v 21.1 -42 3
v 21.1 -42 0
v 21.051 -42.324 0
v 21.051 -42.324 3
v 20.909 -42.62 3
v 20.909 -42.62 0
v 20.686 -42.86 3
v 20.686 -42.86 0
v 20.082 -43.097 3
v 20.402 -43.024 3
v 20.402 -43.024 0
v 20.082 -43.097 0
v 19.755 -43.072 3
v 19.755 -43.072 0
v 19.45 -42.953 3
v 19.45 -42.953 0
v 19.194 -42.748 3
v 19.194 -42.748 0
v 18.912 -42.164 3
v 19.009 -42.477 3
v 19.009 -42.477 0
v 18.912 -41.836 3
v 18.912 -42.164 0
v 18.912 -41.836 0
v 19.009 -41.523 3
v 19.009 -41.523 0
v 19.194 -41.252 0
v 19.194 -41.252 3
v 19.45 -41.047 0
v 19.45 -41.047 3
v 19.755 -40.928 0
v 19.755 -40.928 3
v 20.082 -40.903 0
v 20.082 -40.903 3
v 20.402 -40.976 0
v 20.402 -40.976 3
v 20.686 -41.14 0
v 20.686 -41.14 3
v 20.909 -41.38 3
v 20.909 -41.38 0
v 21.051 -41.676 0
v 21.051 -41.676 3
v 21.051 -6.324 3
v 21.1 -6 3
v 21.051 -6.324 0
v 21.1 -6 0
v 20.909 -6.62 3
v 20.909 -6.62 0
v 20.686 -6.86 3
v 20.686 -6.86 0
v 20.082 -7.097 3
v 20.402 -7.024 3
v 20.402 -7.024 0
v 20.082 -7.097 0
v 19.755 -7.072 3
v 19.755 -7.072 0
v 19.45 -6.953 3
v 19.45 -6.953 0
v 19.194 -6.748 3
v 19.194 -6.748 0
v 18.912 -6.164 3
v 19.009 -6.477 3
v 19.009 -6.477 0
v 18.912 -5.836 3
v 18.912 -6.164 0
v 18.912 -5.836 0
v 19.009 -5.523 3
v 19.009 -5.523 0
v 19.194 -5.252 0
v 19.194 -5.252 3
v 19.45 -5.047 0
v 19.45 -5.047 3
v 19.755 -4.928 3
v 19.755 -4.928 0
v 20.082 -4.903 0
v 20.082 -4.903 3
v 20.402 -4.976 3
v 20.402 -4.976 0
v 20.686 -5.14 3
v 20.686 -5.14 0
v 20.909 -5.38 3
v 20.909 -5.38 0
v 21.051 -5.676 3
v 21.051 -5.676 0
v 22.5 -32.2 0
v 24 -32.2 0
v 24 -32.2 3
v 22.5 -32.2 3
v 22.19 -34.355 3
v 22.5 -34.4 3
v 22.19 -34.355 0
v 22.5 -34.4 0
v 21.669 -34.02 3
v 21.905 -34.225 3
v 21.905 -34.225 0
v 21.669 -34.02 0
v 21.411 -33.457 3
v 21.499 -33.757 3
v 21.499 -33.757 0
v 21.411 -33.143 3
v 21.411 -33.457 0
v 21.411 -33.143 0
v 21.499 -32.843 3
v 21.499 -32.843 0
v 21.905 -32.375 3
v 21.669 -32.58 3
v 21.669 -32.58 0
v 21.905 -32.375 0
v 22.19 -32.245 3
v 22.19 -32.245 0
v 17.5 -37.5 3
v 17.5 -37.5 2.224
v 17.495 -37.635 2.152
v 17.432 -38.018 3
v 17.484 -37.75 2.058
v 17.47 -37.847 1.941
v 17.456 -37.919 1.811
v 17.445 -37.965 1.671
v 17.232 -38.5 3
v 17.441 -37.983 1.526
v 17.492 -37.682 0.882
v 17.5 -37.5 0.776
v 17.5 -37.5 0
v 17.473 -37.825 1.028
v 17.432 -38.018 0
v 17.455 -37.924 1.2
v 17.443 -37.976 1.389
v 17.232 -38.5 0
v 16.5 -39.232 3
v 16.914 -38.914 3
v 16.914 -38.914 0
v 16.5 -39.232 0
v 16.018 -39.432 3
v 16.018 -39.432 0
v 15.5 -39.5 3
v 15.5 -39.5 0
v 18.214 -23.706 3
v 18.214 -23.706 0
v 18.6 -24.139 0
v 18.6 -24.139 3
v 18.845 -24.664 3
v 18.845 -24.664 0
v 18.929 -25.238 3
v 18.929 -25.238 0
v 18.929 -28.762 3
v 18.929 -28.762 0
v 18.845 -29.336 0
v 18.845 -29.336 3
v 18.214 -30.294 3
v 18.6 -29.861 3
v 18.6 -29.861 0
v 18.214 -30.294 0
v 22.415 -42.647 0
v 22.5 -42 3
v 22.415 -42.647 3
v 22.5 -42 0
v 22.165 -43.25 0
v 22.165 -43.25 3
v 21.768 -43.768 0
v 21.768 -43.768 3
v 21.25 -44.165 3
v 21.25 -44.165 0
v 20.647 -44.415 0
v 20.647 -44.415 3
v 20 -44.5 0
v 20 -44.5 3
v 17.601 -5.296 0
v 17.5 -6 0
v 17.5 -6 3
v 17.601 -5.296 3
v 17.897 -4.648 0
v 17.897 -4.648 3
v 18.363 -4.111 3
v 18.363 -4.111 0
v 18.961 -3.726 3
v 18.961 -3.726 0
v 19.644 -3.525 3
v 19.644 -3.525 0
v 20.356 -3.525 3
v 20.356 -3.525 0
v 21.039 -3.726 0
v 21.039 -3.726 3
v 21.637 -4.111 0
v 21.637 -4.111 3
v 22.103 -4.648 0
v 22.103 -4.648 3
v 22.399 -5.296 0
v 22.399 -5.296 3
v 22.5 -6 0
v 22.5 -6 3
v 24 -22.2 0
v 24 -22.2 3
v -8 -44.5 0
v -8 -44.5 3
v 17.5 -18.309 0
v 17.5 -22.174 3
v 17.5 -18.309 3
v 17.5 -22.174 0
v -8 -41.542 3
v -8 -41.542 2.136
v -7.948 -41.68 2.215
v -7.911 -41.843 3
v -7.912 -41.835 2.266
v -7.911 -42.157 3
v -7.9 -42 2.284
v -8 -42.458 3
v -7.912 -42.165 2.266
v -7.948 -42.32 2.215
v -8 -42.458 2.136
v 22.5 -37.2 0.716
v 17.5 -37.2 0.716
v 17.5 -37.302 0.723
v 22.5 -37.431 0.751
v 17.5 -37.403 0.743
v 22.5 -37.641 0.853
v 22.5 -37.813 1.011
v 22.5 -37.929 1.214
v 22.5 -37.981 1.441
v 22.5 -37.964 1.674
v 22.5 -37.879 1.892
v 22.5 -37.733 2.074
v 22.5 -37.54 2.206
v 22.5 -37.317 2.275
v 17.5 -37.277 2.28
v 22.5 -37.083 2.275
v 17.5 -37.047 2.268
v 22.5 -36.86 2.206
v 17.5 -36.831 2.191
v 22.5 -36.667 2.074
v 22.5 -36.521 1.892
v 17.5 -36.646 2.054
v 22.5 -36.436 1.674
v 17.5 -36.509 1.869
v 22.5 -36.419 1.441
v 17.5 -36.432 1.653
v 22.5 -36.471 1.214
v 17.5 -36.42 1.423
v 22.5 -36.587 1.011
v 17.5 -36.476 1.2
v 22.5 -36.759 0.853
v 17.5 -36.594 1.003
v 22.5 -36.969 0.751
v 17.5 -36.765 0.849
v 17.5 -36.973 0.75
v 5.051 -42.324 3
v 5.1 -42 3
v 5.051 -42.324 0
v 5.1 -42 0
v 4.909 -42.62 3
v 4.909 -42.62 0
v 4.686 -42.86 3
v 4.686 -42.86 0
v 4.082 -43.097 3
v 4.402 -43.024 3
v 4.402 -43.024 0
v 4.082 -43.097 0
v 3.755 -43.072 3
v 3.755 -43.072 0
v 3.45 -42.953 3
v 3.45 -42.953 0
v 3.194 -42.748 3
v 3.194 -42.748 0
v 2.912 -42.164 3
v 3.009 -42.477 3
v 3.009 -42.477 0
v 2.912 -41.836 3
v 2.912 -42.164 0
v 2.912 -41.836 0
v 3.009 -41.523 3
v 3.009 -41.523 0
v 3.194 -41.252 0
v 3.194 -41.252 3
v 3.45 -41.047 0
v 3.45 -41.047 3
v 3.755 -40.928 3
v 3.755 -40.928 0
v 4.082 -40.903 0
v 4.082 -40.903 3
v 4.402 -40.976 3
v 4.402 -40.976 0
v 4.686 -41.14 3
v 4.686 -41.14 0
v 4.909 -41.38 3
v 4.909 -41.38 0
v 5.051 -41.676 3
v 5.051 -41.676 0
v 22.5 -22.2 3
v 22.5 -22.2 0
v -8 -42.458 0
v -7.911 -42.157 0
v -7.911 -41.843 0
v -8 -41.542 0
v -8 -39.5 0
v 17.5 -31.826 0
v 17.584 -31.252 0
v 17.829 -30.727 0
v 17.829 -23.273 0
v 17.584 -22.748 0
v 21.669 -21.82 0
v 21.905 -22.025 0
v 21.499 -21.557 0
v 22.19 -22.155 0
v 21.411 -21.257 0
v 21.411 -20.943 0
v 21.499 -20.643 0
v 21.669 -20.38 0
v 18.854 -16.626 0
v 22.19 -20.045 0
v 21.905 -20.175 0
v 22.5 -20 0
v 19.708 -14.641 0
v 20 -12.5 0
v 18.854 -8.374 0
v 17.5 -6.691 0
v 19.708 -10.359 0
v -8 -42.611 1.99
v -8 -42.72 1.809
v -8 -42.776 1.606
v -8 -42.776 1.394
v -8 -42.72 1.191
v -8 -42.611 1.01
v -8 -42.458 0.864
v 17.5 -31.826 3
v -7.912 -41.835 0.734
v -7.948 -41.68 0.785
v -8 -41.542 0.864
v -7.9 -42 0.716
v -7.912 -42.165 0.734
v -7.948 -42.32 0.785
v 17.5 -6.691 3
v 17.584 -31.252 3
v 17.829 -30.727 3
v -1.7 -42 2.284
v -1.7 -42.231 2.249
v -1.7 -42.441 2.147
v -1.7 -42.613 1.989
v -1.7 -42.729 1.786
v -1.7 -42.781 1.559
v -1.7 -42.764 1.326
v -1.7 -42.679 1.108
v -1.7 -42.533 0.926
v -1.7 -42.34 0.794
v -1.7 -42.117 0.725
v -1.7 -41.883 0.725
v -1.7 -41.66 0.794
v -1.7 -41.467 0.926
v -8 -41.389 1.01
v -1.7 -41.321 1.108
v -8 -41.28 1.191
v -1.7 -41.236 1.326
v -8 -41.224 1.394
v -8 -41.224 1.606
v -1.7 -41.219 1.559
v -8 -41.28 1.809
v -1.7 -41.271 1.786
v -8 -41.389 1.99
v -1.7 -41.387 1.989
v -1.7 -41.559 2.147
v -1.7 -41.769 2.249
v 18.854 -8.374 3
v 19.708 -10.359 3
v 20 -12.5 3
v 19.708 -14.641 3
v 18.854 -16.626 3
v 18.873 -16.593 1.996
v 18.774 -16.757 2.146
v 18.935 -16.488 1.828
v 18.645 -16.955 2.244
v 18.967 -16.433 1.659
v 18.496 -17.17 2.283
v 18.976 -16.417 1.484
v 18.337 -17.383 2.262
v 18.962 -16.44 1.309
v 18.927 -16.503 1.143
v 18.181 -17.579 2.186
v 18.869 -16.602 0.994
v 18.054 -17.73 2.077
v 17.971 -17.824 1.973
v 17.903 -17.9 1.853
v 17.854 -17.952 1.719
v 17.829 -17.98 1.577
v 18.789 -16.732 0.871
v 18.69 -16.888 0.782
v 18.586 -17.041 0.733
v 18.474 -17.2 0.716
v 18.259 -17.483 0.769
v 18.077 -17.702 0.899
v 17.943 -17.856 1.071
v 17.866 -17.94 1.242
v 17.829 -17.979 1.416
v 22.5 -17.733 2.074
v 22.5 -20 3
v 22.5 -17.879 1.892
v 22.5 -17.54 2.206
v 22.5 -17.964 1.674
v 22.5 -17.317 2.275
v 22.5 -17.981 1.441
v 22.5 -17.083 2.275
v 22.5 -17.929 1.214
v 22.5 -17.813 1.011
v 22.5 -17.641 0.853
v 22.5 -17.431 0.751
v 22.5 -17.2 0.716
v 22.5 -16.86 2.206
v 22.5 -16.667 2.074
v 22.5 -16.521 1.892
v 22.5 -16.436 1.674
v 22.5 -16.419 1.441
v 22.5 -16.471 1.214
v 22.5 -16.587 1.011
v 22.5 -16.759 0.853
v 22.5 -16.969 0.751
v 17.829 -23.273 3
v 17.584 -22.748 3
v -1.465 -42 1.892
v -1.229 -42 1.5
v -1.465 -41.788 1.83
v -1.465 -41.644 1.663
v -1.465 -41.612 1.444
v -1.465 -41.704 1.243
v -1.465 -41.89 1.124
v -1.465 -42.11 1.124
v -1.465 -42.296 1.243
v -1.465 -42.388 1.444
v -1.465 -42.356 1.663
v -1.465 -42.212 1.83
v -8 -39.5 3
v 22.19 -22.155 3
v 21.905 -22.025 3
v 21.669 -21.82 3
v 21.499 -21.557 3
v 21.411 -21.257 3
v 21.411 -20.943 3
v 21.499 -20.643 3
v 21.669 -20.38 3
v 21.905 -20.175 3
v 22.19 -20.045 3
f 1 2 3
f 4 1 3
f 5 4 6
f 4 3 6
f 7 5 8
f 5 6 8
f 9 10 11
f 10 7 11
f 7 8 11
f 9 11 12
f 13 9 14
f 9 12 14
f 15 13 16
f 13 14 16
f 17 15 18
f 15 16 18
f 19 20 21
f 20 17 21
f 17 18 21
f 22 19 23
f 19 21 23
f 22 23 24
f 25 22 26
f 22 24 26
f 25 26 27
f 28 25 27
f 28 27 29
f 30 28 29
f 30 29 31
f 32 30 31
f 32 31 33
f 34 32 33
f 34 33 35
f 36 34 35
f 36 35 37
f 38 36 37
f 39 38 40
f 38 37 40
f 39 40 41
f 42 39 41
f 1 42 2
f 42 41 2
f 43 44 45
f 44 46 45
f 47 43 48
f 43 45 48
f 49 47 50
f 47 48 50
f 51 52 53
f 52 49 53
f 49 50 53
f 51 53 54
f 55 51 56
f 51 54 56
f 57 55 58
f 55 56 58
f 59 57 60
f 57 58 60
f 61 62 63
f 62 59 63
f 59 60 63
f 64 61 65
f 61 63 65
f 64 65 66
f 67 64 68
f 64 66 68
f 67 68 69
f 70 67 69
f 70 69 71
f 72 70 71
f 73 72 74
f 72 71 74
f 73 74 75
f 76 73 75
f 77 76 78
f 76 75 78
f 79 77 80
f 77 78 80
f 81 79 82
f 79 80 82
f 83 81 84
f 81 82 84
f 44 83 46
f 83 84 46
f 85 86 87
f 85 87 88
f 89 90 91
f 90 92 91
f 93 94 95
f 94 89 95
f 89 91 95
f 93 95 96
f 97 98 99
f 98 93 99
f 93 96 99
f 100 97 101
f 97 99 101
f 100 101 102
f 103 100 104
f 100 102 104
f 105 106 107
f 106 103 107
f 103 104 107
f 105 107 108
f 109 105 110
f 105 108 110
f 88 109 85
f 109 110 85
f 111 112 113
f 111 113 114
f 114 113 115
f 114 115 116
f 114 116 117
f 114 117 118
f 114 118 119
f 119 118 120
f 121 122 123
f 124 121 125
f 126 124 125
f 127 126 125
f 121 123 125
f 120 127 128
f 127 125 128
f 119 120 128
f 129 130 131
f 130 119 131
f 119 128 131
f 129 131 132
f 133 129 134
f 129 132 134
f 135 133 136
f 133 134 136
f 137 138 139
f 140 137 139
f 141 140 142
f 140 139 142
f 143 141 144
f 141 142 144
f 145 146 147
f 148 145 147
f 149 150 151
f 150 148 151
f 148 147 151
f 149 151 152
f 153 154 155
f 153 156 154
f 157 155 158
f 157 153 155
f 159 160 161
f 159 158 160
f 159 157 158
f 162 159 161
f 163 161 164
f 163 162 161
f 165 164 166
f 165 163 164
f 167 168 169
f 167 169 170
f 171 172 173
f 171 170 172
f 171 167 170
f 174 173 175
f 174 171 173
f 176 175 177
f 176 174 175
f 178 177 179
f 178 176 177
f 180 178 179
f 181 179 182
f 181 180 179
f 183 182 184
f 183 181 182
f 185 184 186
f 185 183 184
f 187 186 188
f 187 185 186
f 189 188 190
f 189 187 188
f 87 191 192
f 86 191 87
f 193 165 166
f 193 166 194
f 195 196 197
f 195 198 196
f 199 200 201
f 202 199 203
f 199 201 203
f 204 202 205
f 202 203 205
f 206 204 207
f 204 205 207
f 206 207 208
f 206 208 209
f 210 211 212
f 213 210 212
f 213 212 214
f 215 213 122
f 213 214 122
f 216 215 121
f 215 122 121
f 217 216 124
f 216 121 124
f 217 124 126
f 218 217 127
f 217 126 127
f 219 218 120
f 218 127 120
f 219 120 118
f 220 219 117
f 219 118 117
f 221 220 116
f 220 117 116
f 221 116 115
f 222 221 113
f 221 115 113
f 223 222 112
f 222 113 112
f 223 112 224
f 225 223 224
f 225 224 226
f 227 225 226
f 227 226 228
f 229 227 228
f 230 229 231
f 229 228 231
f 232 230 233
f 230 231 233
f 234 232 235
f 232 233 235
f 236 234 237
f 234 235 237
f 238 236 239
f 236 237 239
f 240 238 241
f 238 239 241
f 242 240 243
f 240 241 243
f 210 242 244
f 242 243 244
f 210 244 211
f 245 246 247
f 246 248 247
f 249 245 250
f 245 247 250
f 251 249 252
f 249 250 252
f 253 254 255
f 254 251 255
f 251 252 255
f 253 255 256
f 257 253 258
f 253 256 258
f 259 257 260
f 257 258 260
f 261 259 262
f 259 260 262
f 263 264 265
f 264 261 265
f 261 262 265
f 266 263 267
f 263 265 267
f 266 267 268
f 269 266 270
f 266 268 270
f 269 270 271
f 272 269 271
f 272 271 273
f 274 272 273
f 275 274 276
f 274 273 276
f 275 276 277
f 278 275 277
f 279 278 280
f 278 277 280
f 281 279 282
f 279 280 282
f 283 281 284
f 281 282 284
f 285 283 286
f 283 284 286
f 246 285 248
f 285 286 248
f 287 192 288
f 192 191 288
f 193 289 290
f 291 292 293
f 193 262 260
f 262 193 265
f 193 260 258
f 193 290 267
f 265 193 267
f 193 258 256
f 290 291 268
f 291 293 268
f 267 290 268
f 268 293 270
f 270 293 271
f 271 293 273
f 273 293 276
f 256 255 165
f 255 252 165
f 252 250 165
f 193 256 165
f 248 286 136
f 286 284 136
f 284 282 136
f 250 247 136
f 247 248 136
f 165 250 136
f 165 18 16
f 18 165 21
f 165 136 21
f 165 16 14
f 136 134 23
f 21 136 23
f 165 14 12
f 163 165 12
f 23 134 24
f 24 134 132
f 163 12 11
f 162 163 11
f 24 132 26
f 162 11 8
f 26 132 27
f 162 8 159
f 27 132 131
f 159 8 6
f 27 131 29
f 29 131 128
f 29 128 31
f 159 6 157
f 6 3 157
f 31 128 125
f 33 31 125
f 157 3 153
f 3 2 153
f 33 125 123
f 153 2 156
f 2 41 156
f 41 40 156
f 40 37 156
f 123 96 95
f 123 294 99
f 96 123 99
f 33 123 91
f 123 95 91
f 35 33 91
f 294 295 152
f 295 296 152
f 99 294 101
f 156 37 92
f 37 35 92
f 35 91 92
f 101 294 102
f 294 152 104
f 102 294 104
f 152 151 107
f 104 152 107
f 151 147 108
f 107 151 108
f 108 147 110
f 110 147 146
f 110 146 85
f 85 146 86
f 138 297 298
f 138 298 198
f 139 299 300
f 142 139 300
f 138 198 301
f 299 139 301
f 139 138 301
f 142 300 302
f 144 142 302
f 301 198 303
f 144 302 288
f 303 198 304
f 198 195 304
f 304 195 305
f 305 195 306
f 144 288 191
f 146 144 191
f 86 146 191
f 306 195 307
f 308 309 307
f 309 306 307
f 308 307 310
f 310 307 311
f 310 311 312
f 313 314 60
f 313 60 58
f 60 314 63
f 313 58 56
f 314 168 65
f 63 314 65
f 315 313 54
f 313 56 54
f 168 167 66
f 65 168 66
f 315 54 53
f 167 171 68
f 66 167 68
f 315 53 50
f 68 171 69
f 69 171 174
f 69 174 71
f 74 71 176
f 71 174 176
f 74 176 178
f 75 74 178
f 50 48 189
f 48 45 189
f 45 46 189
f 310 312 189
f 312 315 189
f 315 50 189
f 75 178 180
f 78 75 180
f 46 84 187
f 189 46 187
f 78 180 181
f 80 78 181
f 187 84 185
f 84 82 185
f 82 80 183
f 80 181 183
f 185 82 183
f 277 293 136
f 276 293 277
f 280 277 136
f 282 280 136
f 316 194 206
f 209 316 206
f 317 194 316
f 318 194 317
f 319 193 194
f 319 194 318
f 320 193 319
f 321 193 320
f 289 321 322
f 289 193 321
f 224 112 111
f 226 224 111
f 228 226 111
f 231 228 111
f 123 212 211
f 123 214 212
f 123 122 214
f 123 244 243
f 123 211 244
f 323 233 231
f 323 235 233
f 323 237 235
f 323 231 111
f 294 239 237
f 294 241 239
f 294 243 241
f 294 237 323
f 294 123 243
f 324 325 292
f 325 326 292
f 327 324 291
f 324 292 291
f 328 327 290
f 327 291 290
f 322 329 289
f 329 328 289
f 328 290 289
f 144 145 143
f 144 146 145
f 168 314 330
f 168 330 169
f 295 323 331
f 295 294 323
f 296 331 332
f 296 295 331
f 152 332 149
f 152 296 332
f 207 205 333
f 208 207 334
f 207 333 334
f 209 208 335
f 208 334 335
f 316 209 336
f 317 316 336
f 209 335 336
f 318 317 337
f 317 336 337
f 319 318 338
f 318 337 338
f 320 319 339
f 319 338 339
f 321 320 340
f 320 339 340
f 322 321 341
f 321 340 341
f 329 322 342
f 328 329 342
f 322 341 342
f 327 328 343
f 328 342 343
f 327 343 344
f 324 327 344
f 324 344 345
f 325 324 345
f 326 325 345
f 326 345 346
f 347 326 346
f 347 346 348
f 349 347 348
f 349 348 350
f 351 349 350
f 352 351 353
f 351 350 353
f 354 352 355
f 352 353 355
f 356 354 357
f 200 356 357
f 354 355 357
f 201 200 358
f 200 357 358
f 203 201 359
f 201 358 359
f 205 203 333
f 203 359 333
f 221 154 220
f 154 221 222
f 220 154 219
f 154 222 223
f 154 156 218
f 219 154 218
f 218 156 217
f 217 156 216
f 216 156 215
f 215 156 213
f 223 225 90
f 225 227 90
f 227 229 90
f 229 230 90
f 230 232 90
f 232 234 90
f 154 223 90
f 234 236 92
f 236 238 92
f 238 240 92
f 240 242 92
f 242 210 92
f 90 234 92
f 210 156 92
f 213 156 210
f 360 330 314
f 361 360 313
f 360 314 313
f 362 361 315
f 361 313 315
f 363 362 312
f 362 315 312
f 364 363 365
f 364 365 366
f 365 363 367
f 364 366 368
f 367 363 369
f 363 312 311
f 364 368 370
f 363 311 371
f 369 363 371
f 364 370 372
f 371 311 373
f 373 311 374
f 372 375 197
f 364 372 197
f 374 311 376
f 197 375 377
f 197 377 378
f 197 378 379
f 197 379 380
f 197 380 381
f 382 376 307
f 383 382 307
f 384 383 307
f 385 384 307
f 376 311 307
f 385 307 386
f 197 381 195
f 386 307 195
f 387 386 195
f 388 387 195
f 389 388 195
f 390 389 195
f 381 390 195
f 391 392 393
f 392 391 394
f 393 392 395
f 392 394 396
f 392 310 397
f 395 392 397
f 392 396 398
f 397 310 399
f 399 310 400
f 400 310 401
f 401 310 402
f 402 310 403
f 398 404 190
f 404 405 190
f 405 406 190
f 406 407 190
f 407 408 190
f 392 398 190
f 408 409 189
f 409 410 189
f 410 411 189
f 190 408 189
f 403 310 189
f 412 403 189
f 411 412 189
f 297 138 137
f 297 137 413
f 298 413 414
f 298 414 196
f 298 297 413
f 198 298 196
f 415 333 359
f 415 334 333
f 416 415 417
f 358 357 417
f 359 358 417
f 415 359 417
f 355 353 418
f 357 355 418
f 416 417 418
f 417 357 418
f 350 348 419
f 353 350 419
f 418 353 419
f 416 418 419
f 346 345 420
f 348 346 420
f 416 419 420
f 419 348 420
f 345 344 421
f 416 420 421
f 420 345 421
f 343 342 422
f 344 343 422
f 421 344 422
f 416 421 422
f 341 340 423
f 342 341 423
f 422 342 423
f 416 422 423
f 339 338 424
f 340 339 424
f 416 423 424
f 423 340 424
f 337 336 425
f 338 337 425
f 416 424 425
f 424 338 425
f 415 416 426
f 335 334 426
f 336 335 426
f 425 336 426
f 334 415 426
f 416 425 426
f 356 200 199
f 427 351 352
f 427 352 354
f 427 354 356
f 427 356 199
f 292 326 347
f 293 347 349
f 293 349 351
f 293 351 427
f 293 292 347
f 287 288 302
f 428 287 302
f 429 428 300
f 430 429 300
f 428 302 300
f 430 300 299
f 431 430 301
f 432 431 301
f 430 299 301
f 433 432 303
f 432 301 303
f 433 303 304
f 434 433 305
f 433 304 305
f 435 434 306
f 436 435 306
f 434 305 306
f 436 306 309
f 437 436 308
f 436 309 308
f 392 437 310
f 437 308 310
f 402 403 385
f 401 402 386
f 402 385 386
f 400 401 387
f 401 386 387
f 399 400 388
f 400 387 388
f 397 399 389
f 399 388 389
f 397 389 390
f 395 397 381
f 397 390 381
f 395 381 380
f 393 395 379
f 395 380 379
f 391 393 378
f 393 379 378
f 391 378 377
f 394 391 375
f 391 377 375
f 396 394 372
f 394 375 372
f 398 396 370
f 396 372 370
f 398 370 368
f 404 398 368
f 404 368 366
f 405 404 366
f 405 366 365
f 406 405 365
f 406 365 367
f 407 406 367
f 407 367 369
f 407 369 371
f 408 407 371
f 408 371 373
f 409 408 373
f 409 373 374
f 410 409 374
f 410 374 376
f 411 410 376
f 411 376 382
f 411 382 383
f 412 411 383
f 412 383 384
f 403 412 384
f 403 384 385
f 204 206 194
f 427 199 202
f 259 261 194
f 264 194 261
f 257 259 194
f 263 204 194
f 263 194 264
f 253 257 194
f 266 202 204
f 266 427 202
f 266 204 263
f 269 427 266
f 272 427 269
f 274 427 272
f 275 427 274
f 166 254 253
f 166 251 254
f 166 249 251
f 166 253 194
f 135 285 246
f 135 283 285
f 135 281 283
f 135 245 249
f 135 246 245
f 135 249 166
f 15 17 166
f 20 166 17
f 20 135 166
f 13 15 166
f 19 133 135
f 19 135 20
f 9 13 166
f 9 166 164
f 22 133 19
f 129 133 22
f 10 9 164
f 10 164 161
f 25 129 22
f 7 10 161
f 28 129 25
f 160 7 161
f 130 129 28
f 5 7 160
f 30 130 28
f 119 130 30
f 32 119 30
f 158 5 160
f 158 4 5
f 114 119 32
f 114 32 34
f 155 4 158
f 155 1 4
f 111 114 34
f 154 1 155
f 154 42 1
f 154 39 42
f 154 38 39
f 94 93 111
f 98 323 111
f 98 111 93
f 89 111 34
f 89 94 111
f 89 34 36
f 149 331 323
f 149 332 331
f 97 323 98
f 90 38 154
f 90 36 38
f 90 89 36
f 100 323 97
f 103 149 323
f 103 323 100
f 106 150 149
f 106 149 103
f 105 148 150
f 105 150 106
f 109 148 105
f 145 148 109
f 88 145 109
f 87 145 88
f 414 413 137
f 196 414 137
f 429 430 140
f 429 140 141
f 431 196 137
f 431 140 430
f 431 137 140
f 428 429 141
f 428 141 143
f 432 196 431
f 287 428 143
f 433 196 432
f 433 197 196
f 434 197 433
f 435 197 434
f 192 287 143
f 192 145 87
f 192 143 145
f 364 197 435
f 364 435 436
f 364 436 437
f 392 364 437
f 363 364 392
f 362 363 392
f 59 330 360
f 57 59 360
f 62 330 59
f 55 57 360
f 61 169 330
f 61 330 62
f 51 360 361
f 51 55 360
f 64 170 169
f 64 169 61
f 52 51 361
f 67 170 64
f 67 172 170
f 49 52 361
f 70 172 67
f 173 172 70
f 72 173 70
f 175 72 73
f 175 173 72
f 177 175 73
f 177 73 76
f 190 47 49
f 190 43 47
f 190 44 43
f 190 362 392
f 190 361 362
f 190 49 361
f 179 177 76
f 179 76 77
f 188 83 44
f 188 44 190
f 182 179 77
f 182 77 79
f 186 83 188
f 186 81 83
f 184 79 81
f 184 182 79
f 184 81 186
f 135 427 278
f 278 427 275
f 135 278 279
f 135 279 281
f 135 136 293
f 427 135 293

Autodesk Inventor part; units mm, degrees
ref_plane "YZ Plane" through (0, 0, 0) normal (1, 0, 0) x (0, 1, 0)
ref_plane "XZ Plane" through (0, 0, 0) normal (0, 1, 0) x (-1, 0, 0)
ref_plane "XY Plane" through (0, 0, 0) normal (0, 0, 1) x (1, 0, 0)
sketch "スケッチ1" plane through (0, 0, 0) normal (0, 0, 1) x (1, 0, 0)
  circle A0 centre (20, -42) radius 1 projected
  circle A1 centre (4, -42) radius 1 projected
  circle A2 centre (20, -6) radius 1 projected
  circle A3 centre (20, -42) radius 1.1
  line L0 (22.5, -78.2) -> (22.5, -32.2) projected
  circle A4 centre (20, -42) radius 2.5
  circle A5 centre (20, -6) radius 2.5
  circle A6 centre (20, -6) radius 1.1
  circle A7 centre (4, -42) radius 1.1
  circle A8 centre (4, -42) radius 2.5
  line L1 (-8, -45.7) -> (-8, -64.7) projected
  line L2 (-8, -44.5) -> (-8, -39.5)
  line L3 (17.5, -42) -> (17.5, -6)
  line L4 (20, -39.5) -> (-8, -39.5)
  line L5 (20, -44.5) -> (4, -44.5)
  line L6 (4, -44.5) -> (-8, -44.5)
  line L7 (24, -24.4) -> (24, -30) projected
  line L8 (24, -32.2) -> (22.5, -32.2) projected
  line L9 (24, -22.2) -> (22.5, -22.2) projected
  line L10 (24, -32.2) -> (22.5, -32.2)
  line L11 (22.5, -32.2) -> (22.5, -22.2)
  line L12 (22.5, -22.2) -> (24, -22.2)
  line L13 (24, -22.2) -> (24, -32.2)
  line L14 (22.5, -22.2) -> (22.5, -6)
  line L15 (2, -43.5) -> (2, -4.5) projected
  arc A9 (2, -43.5) -> (2.5, -44) centre (2.5, -43.5) ccw projected
  line L16 (21.5, -44) -> (2.5, -44) projected
  arc A10 (21.5, -44) -> (22, -43.5) centre (21.5, -43.5) ccw projected
  line L17 (22, -4.5) -> (22, -43.5) projected
  arc A11 (22, -4.5) -> (21.5, -4) centre (21.5, -4.5) ccw projected
  line L18 (2.5, -4) -> (21.5, -4) projected
  arc A12 (2.5, -4) -> (2, -4.5) centre (2.5, -4.5) ccw projected
  line L19 (18.4286, -23.8214) -> (18.4286, -30.1786) projected
  line L20 (18.4286, -30.1786) -> (14.5714, -30.1786) projected
  line L21 (14.5714, -30.1786) -> (14.5714, -23.8214) projected
  line L22 (14.5714, -23.8214) -> (18.4286, -23.8214) projected
  circle A13 centre (12, -31.4) radius 1.1519 projected
  line L23 (5.5714, -23.8214) -> (9.4286, -23.8214) projected
  line L24 (9.4286, -23.8214) -> (9.4286, -30.1786) projected
  line L25 (9.4286, -30.1786) -> (5.5714, -30.1786) projected
  line L26 (5.5714, -30.1786) -> (5.5714, -23.8214) projected
  circle A14 centre (20, -6) radius 1.8131 projected
  circle A15 centre (4, -6) radius 1.8131 projected
  circle A16 centre (20, -42) radius 1.8131 projected
  circle A17 centre (4, -42) radius 1.8131 projected
  arc A18 (18.25, -12.4893) -> (5.75, -12.5) centre (12, -12.5) ccw projected
  arc A19 (18.5, -12.25) -> (18.2502, -12.4893) centre (18.5, -12.5) ccw projected
  line L27 (18.5, -12.25) -> (20.25, -12.25) projected
  arc A20 (20.25, -12.75) -> (20.25, -12.25) centre (20.25, -12.5) ccw projected
  line L28 (20.25, -12.75) -> (18.5, -12.75) projected
  arc A21 (18.25, -12.5) -> (18.5, -12.75) centre (18.5, -12.5) ccw projected
  arc A22 (17.7742, -14.8918) -> (18.25, -12.5) centre (12, -12.5) ccw projected
  arc A23 (18.1009, -14.7565) -> (17.7742, -14.8918) centre (18.0052, -14.9874) ccw projected
  line L29 (18.1009, -14.7565) -> (19.7177, -15.4262) projected
  arc A24 (19.5263, -15.8881) -> (19.7177, -15.4262) centre (19.622, -15.6571) ccw projected
  line L30 (19.5263, -15.8881) -> (17.9095, -15.2184) projected
  arc A25 (17.7742, -14.8918) -> (17.9095, -15.2184) centre (18.0052, -14.9874) ccw projected
  arc A26 (16.4194, -16.9194) -> (17.7742, -14.8918) centre (12, -12.5) ccw projected
  arc A27 (16.773, -16.9194) -> (16.4194, -16.9194) centre (16.5962, -17.0962) ccw projected
  line L31 (16.773, -16.9194) -> (18.0104, -18.1569) projected
  arc A28 (17.6569, -18.5104) -> (18.0104, -18.1569) centre (17.8336, -18.3336) ccw projected
  line L32 (17.6569, -18.5104) -> (16.4194, -17.273) projected
  arc A29 (16.4194, -16.9194) -> (16.4194, -17.273) centre (16.5962, -17.0962) ccw projected
  arc A30 (14.3918, -18.2742) -> (16.4194, -16.9194) centre (12, -12.5) ccw projected
  arc A31 (14.7184, -18.4095) -> (14.3918, -18.2742) centre (14.4874, -18.5052) ccw projected
  line L33 (14.7184, -18.4095) -> (15.3881, -20.0263) projected
  arc A32 (14.9262, -20.2177) -> (15.3881, -20.0263) centre (15.1571, -20.122) ccw projected
  line L34 (14.9262, -20.2177) -> (14.2565, -18.6009) projected
  arc A33 (14.3918, -18.2742) -> (14.2565, -18.6009) centre (14.4874, -18.5052) ccw projected
  arc A34 (12, -18.75) -> (14.3918, -18.2742) centre (12, -12.5) ccw projected
  arc A35 (12.25, -19) -> (12, -18.75) centre (12, -19) ccw projected
  line L35 (12.25, -19) -> (12.25, -20.75) projected
  arc A36 (11.75, -20.75) -> (12.25, -20.75) centre (12, -20.75) ccw projected
  line L36 (11.75, -20.75) -> (11.75, -19) projected
  arc A37 (12, -18.75) -> (11.75, -19) centre (12, -19) ccw projected
  arc A38 (9.6082, -18.2742) -> (12, -18.75) centre (12, -12.5) ccw projected
  arc A39 (9.7435, -18.6009) -> (9.6082, -18.2742) centre (9.5126, -18.5052) ccw projected
  line L37 (9.7435, -18.6009) -> (9.0738, -20.2177) projected
  arc A40 (8.6119, -20.0263) -> (9.0738, -20.2177) centre (8.8429, -20.122) ccw projected
  line L38 (8.6119, -20.0263) -> (9.2816, -18.4095) projected
  arc A41 (9.6082, -18.2742) -> (9.2816, -18.4095) centre (9.5126, -18.5052) ccw projected
  arc A42 (7.5806, -16.9194) -> (9.6082, -18.2742) centre (12, -12.5) ccw projected
  arc A43 (7.5806, -17.273) -> (7.5806, -16.9194) centre (7.4038, -17.0962) ccw projected
  line L39 (7.5806, -17.273) -> (6.3431, -18.5104) projected
  arc A44 (5.9896, -18.1569) -> (6.3431, -18.5104) centre (6.1664, -18.3336) ccw projected
  line L40 (5.9896, -18.1569) -> (7.227, -16.9194) projected
  arc A45 (7.5806, -16.9194) -> (7.227, -16.9194) centre (7.4038, -17.0962) ccw projected
  arc A46 (6.2258, -14.8918) -> (7.5806, -16.9194) centre (12, -12.5) ccw projected
  arc A47 (6.0905, -15.2184) -> (6.2258, -14.8918) centre (5.9948, -14.9874) ccw projected
  line L41 (6.0905, -15.2184) -> (4.4737, -15.8881) projected
  arc A48 (4.2823, -15.4262) -> (4.4737, -15.8881) centre (4.378, -15.6571) ccw projected
  line L42 (4.2823, -15.4262) -> (5.8991, -14.7565) projected
  arc A49 (6.2258, -14.8918) -> (5.8991, -14.7565) centre (5.9948, -14.9874) ccw projected
  arc A50 (5.75, -12.5) -> (6.2258, -14.8918) centre (12, -12.5) ccw projected
  arc A51 (5.5, -12.75) -> (5.75, -12.5) centre (5.5, -12.5) ccw projected
  line L43 (5.5, -12.75) -> (3.75, -12.75) projected
  arc A52 (3.75, -12.25) -> (3.75, -12.75) centre (3.75, -12.5) ccw projected
  line L44 (3.75, -12.25) -> (5.5, -12.25) projected
  arc A53 (5.75, -12.5) -> (5.5, -12.25) centre (5.5, -12.5) ccw projected
  line L45 (18.9286, -30.6786) -> (18.9286, -23.3214)
  line L46 (18.9286, -23.3214) -> (14.0714, -23.3214)
  line L47 (14.0714, -23.3214) -> (14.0714, -30.6786)
  line L48 (14.0714, -30.6786) -> (18.9286, -30.6786)
  circle A54 centre (22.5, -21.1) radius 1.1
  circle A55 centre (22.5, -33.3) radius 1.1
  circle A56 centre (-9, -42) radius 1.1
  circle A57 centre (12, -12.5) radius 6.25
  circle A58 centre (12, -12.5) radius 8
  point P0 (0, 0)
  point P1 (-8, -42)
  point P2 (-8, -41.5417)
  point P3 (-8, -42.4583)
  point P4 (22.5, -42)
  point P5 (22.5, -34.4)
  point P6 (22.5, -20)
  point P7 (17.5, -9.5314)
  point P8 (18.25, -12.5)
  point P9 (17.5, -15.4686)
  point P10 (17.5, -17.6464)
  point P11 (17.5, -18.3536)
  point P12 (17.5, -23.3214)
  point P13 (17.5, -30.6786)
  point P14 (17.5, -39.5)
  point P15 (17.5, -6.6905)
  point P16 (17.5, -18.3095)
  dimension "d0" = 2.2
  dimension "d1" = 2.2
  dimension "d2" = 2.2
  dimension "d3" = 0.5
  dimension "d4" = 2.2
  dimension "d5" = 2.2
  dimension "d6" = 2.2
  dimension "d7" = 1
extrude "押し出し1" add sketch "スケッチ1" along normal blind 3 contours A4 L17 A55 L0 | A4 L17 | A4 L16 L17 | A4 L4 L3 L48 L45 L46 L32 A28 L31 A58 L30 A24 L29 L28 A20 L27 A5 L17 A54 A55 | L11 L9 L13 L7 L8 | A55 L17 A54 L11 | A4 L16 | A4 L3 L4 | L5 A8 L16 A4 | L16 A8 L4 L3 A4 | A54 L17 A5 L14 | L6 L2 A56 L4 L15 A8 A9 | A8 L16 | L16 A8 L15 | A8 L15 L4 | A5 L17 | A9 A8 | L15 A8 | L17 A5 A58 L18 | L18 A5 | A58 L3 A5 | L27 A20 L28 A58 | L3 A58 L31 A28 L32 | L29 A24 L30 A58 | A14 | A16 | A17
fillet "フィレット1" radius 2 4 edges at (17.5, -30.6786, 1.5) (18.9286, -30.6786, 1.5) (17.5, -23.3214, 1.5) (18.9286, -23.3214, 1.5)
sketch "スケッチ2" plane through (22.5, -42, 0) normal (1, 0, 0) x (0, 0, -1)
  circle A0 centre (-1.5, 24.8) radius 1.1 projected
  circle A1 centre (-1.5, 4.8) radius 1.1 projected
  point P0 (0, 42)
hole "穴1" at (22.5, -17.2, 1.5) at (22.5, -37.2, 1.5) direction (-1, 0, 0) diameter 1.567 depth 6.3 tip angle 118 thread size "M2x0.4" class "6H" standard "ISO Metric profile"
sketch "スケッチ3" plane through (-8, -44.5, 0) normal (-1, 0, 0) x (0, 0, 1)
  line L0 (0, 2.5) -> (3, 2.5) projected
  point P0 (0, 44.5)
  point P1 (1.5, 2.5)
hole "穴2" at (-8, -42, 1.5) direction (1, 0, 0) diameter 1.567 depth 6.3 tip angle 118 thread size "M2x0.4" class "6H" standard "ISO Metric profile"
fillet "フィレット2" radius 2 1 edges at (17.5, -39.5, 1.5)
properties part number "mata3" material "アルミニウム 2014-T4"
